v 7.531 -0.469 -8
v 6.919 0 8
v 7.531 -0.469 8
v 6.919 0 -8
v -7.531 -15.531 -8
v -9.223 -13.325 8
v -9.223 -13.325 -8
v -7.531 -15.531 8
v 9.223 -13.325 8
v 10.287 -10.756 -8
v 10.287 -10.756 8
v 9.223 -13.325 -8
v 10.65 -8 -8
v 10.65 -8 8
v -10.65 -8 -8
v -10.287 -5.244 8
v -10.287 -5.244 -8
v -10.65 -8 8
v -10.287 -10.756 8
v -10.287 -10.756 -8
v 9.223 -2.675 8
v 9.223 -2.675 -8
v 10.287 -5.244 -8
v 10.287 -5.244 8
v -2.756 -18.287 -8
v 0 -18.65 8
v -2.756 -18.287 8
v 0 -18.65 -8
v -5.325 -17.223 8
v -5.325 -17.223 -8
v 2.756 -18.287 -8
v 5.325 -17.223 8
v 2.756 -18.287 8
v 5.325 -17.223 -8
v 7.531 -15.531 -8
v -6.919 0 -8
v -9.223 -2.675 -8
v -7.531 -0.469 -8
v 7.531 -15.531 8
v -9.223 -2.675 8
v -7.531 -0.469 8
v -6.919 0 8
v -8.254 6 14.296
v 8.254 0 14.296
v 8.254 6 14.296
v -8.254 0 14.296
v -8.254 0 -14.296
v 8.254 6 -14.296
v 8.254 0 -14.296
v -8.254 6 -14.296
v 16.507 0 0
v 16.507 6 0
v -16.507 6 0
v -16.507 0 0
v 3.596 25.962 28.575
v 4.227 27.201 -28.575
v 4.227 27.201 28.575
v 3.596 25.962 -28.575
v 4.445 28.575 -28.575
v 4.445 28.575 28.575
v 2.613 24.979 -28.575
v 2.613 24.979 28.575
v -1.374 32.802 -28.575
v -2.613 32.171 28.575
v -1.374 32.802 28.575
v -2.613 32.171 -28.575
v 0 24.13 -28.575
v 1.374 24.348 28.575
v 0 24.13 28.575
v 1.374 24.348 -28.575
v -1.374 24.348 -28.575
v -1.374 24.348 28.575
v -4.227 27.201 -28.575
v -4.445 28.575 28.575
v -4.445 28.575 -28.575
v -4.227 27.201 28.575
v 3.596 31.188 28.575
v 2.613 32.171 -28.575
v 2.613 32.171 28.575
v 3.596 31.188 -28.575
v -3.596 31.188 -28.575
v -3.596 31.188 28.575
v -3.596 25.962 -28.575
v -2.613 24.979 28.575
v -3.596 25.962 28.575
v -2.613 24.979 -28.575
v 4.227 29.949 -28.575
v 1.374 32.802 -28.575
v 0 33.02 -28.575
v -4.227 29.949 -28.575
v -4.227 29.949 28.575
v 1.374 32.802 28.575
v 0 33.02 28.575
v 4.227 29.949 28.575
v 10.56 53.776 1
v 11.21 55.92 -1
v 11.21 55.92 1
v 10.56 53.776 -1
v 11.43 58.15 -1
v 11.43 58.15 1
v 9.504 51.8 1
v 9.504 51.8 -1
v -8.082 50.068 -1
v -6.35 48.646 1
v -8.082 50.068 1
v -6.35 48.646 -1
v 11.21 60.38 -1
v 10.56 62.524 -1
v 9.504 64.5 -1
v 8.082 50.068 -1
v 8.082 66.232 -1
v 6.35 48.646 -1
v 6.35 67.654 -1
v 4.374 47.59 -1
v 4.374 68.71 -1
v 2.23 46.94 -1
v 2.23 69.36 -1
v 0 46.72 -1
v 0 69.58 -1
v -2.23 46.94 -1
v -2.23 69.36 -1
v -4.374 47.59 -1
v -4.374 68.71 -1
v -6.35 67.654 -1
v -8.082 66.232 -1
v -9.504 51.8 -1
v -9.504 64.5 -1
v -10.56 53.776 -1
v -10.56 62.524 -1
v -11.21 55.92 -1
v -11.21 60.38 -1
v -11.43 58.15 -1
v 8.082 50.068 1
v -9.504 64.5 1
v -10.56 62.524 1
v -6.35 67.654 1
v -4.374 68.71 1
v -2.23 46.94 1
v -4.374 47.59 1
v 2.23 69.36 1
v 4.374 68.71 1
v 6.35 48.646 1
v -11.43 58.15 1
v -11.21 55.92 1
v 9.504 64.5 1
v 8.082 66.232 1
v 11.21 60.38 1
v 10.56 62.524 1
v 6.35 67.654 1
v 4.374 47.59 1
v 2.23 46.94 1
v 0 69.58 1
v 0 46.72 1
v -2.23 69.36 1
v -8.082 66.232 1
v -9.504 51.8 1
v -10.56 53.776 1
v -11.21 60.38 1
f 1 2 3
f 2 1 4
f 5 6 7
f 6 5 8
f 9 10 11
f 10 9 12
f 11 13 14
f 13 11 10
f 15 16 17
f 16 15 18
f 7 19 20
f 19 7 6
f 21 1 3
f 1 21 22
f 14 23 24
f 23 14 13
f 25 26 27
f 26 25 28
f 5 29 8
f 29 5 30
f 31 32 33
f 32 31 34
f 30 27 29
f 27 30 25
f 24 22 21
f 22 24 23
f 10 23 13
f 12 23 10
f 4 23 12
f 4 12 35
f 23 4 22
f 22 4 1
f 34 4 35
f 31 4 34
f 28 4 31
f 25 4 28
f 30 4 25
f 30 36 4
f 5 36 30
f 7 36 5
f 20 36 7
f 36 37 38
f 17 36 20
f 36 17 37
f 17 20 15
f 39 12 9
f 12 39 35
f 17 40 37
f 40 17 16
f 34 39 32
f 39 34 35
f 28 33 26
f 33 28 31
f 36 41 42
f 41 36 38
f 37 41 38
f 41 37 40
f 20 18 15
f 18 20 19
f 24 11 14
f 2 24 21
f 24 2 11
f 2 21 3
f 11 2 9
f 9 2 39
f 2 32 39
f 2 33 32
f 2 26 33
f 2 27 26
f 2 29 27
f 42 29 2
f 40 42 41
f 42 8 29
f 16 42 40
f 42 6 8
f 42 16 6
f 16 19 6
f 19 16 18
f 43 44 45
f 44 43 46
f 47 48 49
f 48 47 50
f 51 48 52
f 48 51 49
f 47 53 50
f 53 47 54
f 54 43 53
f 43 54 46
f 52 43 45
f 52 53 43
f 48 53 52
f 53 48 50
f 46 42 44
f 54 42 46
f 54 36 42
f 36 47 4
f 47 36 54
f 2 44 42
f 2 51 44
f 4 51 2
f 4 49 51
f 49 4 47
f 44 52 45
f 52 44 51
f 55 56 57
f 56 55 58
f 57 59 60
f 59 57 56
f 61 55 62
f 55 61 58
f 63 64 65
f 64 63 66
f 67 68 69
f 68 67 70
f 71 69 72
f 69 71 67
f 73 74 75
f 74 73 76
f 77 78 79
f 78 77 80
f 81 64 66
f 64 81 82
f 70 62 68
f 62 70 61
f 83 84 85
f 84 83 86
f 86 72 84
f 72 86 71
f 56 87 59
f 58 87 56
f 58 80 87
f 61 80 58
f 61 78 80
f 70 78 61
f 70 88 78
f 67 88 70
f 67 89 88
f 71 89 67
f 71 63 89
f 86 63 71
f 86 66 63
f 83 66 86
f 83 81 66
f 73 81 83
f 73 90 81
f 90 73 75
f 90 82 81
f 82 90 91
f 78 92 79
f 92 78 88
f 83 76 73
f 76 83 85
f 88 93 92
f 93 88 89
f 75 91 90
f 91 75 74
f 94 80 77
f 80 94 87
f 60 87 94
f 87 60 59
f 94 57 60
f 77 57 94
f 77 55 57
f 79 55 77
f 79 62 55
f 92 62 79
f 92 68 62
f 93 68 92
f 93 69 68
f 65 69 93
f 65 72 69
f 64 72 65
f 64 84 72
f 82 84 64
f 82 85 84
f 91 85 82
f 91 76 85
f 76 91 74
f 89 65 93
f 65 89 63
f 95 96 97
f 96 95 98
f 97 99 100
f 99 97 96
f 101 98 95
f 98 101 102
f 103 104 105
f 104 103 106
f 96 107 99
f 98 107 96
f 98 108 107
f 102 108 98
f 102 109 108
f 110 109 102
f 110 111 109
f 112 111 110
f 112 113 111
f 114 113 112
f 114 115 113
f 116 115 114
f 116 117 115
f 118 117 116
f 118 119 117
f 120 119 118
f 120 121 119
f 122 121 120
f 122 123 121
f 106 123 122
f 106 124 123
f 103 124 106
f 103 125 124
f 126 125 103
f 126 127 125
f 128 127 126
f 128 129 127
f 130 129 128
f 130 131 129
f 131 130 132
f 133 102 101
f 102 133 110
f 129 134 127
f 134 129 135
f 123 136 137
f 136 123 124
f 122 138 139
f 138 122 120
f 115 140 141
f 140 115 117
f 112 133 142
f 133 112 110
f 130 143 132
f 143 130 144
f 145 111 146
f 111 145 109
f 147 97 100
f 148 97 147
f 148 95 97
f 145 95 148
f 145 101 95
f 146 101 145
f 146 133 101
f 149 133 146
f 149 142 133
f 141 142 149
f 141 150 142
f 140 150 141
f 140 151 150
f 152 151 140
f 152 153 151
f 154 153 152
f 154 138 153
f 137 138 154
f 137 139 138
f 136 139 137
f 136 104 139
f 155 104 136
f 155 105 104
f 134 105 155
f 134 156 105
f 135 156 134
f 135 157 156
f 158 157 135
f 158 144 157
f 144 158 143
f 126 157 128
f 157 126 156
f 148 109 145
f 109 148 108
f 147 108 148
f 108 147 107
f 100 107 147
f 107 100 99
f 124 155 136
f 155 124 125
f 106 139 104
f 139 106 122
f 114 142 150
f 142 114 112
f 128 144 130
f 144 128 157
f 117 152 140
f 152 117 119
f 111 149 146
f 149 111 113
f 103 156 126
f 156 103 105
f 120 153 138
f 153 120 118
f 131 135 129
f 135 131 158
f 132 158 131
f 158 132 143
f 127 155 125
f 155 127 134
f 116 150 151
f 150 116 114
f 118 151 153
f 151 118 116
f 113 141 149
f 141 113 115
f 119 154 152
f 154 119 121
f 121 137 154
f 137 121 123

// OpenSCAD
// Auto-generated by scripts/author_from_manifest.py (Phase D.3).
// Source: data/phase_d_manifest.json (sku_intent='viking-vk100-upright-175f').
// Do not hand-edit — regenerate from the manifest.
//
// @part viking_vk100_upright_175f
// @kind sprinkler_head
// @category head.upright.k56
// @display-name "Viking VK100 Upright K5.6 SR 175°F"
// @mfg viking_group
// @mfg-pn VK100
// @listing UL FM
// @hazard-classes LH OH1
// @price-usd 12.90
// @install-minutes 8
// @crew journeyman
// @k-factor 5.6
// @orientation upright
// @response standard
// @temperature 175F
// @param size_in number default=0.5 label="Size" unit="in"
// @port inlet position=[0,0.014,0] direction=[0,1,0] style=NPT_threaded size_in=0.5 role=drop

size_in = 0.5;
k_factor = 5.6;

length_mm   = 57.15;
body_dia_mm = 25.40;
thread_od   = 21.3;
thread_len  = 16;
deflector_d = body_dia_mm * 0.9;

rotate([180,0,0]) union() {
    translate([0, thread_len/2, 0])
        cylinder(h = thread_len, d = thread_od, center = true, $fn = 24);
    translate([0, -3, 0])
        rotate([90, 0, 0])
        cylinder(h = 6, d = thread_od * 1.55, $fn = 6, center = true);
    translate([0, -length_mm/2, 0])
        cylinder(h = length_mm, d = body_dia_mm * 0.35, center = true, $fn = 20);
    translate([0, -length_mm - 1, 0])
        cylinder(h = 2, d = deflector_d, center = true, $fn = 32);
}
